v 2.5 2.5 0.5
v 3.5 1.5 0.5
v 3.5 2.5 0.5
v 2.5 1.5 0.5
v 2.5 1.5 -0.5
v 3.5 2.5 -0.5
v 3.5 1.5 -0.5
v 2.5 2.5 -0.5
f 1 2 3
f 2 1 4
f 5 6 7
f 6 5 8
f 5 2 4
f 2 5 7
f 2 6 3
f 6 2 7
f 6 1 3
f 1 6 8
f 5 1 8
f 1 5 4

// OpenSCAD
r = 5;
f = [3, 2, 0];

/*for(x = [-r:1:r]) {
	for(y = [-r:1:r]) {
		for(z = [-r:1:r]) {
			if(x*x + y*y + z*z <= r*r)
				translate([x, y, z])
					cube([1, 1, 1], center = true);
		}
	}
}*/


translate(f) cube([1, 1, 1], center = true);

fr = sqrt(f[0]*f[0] + f[1]*f[1] + f[2]*f[2]);

for(x = [f[0]:1:fr]) {
	for(y = [f[1]:1:fr]) {
		for(z = [f[2]:1:fr]) {
			if(x*x + y*y + z*z < fr*fr) {
				translate([x, y, z])
					cube([1, 1, 1], center = true);
			}
		}
	}
}
			
